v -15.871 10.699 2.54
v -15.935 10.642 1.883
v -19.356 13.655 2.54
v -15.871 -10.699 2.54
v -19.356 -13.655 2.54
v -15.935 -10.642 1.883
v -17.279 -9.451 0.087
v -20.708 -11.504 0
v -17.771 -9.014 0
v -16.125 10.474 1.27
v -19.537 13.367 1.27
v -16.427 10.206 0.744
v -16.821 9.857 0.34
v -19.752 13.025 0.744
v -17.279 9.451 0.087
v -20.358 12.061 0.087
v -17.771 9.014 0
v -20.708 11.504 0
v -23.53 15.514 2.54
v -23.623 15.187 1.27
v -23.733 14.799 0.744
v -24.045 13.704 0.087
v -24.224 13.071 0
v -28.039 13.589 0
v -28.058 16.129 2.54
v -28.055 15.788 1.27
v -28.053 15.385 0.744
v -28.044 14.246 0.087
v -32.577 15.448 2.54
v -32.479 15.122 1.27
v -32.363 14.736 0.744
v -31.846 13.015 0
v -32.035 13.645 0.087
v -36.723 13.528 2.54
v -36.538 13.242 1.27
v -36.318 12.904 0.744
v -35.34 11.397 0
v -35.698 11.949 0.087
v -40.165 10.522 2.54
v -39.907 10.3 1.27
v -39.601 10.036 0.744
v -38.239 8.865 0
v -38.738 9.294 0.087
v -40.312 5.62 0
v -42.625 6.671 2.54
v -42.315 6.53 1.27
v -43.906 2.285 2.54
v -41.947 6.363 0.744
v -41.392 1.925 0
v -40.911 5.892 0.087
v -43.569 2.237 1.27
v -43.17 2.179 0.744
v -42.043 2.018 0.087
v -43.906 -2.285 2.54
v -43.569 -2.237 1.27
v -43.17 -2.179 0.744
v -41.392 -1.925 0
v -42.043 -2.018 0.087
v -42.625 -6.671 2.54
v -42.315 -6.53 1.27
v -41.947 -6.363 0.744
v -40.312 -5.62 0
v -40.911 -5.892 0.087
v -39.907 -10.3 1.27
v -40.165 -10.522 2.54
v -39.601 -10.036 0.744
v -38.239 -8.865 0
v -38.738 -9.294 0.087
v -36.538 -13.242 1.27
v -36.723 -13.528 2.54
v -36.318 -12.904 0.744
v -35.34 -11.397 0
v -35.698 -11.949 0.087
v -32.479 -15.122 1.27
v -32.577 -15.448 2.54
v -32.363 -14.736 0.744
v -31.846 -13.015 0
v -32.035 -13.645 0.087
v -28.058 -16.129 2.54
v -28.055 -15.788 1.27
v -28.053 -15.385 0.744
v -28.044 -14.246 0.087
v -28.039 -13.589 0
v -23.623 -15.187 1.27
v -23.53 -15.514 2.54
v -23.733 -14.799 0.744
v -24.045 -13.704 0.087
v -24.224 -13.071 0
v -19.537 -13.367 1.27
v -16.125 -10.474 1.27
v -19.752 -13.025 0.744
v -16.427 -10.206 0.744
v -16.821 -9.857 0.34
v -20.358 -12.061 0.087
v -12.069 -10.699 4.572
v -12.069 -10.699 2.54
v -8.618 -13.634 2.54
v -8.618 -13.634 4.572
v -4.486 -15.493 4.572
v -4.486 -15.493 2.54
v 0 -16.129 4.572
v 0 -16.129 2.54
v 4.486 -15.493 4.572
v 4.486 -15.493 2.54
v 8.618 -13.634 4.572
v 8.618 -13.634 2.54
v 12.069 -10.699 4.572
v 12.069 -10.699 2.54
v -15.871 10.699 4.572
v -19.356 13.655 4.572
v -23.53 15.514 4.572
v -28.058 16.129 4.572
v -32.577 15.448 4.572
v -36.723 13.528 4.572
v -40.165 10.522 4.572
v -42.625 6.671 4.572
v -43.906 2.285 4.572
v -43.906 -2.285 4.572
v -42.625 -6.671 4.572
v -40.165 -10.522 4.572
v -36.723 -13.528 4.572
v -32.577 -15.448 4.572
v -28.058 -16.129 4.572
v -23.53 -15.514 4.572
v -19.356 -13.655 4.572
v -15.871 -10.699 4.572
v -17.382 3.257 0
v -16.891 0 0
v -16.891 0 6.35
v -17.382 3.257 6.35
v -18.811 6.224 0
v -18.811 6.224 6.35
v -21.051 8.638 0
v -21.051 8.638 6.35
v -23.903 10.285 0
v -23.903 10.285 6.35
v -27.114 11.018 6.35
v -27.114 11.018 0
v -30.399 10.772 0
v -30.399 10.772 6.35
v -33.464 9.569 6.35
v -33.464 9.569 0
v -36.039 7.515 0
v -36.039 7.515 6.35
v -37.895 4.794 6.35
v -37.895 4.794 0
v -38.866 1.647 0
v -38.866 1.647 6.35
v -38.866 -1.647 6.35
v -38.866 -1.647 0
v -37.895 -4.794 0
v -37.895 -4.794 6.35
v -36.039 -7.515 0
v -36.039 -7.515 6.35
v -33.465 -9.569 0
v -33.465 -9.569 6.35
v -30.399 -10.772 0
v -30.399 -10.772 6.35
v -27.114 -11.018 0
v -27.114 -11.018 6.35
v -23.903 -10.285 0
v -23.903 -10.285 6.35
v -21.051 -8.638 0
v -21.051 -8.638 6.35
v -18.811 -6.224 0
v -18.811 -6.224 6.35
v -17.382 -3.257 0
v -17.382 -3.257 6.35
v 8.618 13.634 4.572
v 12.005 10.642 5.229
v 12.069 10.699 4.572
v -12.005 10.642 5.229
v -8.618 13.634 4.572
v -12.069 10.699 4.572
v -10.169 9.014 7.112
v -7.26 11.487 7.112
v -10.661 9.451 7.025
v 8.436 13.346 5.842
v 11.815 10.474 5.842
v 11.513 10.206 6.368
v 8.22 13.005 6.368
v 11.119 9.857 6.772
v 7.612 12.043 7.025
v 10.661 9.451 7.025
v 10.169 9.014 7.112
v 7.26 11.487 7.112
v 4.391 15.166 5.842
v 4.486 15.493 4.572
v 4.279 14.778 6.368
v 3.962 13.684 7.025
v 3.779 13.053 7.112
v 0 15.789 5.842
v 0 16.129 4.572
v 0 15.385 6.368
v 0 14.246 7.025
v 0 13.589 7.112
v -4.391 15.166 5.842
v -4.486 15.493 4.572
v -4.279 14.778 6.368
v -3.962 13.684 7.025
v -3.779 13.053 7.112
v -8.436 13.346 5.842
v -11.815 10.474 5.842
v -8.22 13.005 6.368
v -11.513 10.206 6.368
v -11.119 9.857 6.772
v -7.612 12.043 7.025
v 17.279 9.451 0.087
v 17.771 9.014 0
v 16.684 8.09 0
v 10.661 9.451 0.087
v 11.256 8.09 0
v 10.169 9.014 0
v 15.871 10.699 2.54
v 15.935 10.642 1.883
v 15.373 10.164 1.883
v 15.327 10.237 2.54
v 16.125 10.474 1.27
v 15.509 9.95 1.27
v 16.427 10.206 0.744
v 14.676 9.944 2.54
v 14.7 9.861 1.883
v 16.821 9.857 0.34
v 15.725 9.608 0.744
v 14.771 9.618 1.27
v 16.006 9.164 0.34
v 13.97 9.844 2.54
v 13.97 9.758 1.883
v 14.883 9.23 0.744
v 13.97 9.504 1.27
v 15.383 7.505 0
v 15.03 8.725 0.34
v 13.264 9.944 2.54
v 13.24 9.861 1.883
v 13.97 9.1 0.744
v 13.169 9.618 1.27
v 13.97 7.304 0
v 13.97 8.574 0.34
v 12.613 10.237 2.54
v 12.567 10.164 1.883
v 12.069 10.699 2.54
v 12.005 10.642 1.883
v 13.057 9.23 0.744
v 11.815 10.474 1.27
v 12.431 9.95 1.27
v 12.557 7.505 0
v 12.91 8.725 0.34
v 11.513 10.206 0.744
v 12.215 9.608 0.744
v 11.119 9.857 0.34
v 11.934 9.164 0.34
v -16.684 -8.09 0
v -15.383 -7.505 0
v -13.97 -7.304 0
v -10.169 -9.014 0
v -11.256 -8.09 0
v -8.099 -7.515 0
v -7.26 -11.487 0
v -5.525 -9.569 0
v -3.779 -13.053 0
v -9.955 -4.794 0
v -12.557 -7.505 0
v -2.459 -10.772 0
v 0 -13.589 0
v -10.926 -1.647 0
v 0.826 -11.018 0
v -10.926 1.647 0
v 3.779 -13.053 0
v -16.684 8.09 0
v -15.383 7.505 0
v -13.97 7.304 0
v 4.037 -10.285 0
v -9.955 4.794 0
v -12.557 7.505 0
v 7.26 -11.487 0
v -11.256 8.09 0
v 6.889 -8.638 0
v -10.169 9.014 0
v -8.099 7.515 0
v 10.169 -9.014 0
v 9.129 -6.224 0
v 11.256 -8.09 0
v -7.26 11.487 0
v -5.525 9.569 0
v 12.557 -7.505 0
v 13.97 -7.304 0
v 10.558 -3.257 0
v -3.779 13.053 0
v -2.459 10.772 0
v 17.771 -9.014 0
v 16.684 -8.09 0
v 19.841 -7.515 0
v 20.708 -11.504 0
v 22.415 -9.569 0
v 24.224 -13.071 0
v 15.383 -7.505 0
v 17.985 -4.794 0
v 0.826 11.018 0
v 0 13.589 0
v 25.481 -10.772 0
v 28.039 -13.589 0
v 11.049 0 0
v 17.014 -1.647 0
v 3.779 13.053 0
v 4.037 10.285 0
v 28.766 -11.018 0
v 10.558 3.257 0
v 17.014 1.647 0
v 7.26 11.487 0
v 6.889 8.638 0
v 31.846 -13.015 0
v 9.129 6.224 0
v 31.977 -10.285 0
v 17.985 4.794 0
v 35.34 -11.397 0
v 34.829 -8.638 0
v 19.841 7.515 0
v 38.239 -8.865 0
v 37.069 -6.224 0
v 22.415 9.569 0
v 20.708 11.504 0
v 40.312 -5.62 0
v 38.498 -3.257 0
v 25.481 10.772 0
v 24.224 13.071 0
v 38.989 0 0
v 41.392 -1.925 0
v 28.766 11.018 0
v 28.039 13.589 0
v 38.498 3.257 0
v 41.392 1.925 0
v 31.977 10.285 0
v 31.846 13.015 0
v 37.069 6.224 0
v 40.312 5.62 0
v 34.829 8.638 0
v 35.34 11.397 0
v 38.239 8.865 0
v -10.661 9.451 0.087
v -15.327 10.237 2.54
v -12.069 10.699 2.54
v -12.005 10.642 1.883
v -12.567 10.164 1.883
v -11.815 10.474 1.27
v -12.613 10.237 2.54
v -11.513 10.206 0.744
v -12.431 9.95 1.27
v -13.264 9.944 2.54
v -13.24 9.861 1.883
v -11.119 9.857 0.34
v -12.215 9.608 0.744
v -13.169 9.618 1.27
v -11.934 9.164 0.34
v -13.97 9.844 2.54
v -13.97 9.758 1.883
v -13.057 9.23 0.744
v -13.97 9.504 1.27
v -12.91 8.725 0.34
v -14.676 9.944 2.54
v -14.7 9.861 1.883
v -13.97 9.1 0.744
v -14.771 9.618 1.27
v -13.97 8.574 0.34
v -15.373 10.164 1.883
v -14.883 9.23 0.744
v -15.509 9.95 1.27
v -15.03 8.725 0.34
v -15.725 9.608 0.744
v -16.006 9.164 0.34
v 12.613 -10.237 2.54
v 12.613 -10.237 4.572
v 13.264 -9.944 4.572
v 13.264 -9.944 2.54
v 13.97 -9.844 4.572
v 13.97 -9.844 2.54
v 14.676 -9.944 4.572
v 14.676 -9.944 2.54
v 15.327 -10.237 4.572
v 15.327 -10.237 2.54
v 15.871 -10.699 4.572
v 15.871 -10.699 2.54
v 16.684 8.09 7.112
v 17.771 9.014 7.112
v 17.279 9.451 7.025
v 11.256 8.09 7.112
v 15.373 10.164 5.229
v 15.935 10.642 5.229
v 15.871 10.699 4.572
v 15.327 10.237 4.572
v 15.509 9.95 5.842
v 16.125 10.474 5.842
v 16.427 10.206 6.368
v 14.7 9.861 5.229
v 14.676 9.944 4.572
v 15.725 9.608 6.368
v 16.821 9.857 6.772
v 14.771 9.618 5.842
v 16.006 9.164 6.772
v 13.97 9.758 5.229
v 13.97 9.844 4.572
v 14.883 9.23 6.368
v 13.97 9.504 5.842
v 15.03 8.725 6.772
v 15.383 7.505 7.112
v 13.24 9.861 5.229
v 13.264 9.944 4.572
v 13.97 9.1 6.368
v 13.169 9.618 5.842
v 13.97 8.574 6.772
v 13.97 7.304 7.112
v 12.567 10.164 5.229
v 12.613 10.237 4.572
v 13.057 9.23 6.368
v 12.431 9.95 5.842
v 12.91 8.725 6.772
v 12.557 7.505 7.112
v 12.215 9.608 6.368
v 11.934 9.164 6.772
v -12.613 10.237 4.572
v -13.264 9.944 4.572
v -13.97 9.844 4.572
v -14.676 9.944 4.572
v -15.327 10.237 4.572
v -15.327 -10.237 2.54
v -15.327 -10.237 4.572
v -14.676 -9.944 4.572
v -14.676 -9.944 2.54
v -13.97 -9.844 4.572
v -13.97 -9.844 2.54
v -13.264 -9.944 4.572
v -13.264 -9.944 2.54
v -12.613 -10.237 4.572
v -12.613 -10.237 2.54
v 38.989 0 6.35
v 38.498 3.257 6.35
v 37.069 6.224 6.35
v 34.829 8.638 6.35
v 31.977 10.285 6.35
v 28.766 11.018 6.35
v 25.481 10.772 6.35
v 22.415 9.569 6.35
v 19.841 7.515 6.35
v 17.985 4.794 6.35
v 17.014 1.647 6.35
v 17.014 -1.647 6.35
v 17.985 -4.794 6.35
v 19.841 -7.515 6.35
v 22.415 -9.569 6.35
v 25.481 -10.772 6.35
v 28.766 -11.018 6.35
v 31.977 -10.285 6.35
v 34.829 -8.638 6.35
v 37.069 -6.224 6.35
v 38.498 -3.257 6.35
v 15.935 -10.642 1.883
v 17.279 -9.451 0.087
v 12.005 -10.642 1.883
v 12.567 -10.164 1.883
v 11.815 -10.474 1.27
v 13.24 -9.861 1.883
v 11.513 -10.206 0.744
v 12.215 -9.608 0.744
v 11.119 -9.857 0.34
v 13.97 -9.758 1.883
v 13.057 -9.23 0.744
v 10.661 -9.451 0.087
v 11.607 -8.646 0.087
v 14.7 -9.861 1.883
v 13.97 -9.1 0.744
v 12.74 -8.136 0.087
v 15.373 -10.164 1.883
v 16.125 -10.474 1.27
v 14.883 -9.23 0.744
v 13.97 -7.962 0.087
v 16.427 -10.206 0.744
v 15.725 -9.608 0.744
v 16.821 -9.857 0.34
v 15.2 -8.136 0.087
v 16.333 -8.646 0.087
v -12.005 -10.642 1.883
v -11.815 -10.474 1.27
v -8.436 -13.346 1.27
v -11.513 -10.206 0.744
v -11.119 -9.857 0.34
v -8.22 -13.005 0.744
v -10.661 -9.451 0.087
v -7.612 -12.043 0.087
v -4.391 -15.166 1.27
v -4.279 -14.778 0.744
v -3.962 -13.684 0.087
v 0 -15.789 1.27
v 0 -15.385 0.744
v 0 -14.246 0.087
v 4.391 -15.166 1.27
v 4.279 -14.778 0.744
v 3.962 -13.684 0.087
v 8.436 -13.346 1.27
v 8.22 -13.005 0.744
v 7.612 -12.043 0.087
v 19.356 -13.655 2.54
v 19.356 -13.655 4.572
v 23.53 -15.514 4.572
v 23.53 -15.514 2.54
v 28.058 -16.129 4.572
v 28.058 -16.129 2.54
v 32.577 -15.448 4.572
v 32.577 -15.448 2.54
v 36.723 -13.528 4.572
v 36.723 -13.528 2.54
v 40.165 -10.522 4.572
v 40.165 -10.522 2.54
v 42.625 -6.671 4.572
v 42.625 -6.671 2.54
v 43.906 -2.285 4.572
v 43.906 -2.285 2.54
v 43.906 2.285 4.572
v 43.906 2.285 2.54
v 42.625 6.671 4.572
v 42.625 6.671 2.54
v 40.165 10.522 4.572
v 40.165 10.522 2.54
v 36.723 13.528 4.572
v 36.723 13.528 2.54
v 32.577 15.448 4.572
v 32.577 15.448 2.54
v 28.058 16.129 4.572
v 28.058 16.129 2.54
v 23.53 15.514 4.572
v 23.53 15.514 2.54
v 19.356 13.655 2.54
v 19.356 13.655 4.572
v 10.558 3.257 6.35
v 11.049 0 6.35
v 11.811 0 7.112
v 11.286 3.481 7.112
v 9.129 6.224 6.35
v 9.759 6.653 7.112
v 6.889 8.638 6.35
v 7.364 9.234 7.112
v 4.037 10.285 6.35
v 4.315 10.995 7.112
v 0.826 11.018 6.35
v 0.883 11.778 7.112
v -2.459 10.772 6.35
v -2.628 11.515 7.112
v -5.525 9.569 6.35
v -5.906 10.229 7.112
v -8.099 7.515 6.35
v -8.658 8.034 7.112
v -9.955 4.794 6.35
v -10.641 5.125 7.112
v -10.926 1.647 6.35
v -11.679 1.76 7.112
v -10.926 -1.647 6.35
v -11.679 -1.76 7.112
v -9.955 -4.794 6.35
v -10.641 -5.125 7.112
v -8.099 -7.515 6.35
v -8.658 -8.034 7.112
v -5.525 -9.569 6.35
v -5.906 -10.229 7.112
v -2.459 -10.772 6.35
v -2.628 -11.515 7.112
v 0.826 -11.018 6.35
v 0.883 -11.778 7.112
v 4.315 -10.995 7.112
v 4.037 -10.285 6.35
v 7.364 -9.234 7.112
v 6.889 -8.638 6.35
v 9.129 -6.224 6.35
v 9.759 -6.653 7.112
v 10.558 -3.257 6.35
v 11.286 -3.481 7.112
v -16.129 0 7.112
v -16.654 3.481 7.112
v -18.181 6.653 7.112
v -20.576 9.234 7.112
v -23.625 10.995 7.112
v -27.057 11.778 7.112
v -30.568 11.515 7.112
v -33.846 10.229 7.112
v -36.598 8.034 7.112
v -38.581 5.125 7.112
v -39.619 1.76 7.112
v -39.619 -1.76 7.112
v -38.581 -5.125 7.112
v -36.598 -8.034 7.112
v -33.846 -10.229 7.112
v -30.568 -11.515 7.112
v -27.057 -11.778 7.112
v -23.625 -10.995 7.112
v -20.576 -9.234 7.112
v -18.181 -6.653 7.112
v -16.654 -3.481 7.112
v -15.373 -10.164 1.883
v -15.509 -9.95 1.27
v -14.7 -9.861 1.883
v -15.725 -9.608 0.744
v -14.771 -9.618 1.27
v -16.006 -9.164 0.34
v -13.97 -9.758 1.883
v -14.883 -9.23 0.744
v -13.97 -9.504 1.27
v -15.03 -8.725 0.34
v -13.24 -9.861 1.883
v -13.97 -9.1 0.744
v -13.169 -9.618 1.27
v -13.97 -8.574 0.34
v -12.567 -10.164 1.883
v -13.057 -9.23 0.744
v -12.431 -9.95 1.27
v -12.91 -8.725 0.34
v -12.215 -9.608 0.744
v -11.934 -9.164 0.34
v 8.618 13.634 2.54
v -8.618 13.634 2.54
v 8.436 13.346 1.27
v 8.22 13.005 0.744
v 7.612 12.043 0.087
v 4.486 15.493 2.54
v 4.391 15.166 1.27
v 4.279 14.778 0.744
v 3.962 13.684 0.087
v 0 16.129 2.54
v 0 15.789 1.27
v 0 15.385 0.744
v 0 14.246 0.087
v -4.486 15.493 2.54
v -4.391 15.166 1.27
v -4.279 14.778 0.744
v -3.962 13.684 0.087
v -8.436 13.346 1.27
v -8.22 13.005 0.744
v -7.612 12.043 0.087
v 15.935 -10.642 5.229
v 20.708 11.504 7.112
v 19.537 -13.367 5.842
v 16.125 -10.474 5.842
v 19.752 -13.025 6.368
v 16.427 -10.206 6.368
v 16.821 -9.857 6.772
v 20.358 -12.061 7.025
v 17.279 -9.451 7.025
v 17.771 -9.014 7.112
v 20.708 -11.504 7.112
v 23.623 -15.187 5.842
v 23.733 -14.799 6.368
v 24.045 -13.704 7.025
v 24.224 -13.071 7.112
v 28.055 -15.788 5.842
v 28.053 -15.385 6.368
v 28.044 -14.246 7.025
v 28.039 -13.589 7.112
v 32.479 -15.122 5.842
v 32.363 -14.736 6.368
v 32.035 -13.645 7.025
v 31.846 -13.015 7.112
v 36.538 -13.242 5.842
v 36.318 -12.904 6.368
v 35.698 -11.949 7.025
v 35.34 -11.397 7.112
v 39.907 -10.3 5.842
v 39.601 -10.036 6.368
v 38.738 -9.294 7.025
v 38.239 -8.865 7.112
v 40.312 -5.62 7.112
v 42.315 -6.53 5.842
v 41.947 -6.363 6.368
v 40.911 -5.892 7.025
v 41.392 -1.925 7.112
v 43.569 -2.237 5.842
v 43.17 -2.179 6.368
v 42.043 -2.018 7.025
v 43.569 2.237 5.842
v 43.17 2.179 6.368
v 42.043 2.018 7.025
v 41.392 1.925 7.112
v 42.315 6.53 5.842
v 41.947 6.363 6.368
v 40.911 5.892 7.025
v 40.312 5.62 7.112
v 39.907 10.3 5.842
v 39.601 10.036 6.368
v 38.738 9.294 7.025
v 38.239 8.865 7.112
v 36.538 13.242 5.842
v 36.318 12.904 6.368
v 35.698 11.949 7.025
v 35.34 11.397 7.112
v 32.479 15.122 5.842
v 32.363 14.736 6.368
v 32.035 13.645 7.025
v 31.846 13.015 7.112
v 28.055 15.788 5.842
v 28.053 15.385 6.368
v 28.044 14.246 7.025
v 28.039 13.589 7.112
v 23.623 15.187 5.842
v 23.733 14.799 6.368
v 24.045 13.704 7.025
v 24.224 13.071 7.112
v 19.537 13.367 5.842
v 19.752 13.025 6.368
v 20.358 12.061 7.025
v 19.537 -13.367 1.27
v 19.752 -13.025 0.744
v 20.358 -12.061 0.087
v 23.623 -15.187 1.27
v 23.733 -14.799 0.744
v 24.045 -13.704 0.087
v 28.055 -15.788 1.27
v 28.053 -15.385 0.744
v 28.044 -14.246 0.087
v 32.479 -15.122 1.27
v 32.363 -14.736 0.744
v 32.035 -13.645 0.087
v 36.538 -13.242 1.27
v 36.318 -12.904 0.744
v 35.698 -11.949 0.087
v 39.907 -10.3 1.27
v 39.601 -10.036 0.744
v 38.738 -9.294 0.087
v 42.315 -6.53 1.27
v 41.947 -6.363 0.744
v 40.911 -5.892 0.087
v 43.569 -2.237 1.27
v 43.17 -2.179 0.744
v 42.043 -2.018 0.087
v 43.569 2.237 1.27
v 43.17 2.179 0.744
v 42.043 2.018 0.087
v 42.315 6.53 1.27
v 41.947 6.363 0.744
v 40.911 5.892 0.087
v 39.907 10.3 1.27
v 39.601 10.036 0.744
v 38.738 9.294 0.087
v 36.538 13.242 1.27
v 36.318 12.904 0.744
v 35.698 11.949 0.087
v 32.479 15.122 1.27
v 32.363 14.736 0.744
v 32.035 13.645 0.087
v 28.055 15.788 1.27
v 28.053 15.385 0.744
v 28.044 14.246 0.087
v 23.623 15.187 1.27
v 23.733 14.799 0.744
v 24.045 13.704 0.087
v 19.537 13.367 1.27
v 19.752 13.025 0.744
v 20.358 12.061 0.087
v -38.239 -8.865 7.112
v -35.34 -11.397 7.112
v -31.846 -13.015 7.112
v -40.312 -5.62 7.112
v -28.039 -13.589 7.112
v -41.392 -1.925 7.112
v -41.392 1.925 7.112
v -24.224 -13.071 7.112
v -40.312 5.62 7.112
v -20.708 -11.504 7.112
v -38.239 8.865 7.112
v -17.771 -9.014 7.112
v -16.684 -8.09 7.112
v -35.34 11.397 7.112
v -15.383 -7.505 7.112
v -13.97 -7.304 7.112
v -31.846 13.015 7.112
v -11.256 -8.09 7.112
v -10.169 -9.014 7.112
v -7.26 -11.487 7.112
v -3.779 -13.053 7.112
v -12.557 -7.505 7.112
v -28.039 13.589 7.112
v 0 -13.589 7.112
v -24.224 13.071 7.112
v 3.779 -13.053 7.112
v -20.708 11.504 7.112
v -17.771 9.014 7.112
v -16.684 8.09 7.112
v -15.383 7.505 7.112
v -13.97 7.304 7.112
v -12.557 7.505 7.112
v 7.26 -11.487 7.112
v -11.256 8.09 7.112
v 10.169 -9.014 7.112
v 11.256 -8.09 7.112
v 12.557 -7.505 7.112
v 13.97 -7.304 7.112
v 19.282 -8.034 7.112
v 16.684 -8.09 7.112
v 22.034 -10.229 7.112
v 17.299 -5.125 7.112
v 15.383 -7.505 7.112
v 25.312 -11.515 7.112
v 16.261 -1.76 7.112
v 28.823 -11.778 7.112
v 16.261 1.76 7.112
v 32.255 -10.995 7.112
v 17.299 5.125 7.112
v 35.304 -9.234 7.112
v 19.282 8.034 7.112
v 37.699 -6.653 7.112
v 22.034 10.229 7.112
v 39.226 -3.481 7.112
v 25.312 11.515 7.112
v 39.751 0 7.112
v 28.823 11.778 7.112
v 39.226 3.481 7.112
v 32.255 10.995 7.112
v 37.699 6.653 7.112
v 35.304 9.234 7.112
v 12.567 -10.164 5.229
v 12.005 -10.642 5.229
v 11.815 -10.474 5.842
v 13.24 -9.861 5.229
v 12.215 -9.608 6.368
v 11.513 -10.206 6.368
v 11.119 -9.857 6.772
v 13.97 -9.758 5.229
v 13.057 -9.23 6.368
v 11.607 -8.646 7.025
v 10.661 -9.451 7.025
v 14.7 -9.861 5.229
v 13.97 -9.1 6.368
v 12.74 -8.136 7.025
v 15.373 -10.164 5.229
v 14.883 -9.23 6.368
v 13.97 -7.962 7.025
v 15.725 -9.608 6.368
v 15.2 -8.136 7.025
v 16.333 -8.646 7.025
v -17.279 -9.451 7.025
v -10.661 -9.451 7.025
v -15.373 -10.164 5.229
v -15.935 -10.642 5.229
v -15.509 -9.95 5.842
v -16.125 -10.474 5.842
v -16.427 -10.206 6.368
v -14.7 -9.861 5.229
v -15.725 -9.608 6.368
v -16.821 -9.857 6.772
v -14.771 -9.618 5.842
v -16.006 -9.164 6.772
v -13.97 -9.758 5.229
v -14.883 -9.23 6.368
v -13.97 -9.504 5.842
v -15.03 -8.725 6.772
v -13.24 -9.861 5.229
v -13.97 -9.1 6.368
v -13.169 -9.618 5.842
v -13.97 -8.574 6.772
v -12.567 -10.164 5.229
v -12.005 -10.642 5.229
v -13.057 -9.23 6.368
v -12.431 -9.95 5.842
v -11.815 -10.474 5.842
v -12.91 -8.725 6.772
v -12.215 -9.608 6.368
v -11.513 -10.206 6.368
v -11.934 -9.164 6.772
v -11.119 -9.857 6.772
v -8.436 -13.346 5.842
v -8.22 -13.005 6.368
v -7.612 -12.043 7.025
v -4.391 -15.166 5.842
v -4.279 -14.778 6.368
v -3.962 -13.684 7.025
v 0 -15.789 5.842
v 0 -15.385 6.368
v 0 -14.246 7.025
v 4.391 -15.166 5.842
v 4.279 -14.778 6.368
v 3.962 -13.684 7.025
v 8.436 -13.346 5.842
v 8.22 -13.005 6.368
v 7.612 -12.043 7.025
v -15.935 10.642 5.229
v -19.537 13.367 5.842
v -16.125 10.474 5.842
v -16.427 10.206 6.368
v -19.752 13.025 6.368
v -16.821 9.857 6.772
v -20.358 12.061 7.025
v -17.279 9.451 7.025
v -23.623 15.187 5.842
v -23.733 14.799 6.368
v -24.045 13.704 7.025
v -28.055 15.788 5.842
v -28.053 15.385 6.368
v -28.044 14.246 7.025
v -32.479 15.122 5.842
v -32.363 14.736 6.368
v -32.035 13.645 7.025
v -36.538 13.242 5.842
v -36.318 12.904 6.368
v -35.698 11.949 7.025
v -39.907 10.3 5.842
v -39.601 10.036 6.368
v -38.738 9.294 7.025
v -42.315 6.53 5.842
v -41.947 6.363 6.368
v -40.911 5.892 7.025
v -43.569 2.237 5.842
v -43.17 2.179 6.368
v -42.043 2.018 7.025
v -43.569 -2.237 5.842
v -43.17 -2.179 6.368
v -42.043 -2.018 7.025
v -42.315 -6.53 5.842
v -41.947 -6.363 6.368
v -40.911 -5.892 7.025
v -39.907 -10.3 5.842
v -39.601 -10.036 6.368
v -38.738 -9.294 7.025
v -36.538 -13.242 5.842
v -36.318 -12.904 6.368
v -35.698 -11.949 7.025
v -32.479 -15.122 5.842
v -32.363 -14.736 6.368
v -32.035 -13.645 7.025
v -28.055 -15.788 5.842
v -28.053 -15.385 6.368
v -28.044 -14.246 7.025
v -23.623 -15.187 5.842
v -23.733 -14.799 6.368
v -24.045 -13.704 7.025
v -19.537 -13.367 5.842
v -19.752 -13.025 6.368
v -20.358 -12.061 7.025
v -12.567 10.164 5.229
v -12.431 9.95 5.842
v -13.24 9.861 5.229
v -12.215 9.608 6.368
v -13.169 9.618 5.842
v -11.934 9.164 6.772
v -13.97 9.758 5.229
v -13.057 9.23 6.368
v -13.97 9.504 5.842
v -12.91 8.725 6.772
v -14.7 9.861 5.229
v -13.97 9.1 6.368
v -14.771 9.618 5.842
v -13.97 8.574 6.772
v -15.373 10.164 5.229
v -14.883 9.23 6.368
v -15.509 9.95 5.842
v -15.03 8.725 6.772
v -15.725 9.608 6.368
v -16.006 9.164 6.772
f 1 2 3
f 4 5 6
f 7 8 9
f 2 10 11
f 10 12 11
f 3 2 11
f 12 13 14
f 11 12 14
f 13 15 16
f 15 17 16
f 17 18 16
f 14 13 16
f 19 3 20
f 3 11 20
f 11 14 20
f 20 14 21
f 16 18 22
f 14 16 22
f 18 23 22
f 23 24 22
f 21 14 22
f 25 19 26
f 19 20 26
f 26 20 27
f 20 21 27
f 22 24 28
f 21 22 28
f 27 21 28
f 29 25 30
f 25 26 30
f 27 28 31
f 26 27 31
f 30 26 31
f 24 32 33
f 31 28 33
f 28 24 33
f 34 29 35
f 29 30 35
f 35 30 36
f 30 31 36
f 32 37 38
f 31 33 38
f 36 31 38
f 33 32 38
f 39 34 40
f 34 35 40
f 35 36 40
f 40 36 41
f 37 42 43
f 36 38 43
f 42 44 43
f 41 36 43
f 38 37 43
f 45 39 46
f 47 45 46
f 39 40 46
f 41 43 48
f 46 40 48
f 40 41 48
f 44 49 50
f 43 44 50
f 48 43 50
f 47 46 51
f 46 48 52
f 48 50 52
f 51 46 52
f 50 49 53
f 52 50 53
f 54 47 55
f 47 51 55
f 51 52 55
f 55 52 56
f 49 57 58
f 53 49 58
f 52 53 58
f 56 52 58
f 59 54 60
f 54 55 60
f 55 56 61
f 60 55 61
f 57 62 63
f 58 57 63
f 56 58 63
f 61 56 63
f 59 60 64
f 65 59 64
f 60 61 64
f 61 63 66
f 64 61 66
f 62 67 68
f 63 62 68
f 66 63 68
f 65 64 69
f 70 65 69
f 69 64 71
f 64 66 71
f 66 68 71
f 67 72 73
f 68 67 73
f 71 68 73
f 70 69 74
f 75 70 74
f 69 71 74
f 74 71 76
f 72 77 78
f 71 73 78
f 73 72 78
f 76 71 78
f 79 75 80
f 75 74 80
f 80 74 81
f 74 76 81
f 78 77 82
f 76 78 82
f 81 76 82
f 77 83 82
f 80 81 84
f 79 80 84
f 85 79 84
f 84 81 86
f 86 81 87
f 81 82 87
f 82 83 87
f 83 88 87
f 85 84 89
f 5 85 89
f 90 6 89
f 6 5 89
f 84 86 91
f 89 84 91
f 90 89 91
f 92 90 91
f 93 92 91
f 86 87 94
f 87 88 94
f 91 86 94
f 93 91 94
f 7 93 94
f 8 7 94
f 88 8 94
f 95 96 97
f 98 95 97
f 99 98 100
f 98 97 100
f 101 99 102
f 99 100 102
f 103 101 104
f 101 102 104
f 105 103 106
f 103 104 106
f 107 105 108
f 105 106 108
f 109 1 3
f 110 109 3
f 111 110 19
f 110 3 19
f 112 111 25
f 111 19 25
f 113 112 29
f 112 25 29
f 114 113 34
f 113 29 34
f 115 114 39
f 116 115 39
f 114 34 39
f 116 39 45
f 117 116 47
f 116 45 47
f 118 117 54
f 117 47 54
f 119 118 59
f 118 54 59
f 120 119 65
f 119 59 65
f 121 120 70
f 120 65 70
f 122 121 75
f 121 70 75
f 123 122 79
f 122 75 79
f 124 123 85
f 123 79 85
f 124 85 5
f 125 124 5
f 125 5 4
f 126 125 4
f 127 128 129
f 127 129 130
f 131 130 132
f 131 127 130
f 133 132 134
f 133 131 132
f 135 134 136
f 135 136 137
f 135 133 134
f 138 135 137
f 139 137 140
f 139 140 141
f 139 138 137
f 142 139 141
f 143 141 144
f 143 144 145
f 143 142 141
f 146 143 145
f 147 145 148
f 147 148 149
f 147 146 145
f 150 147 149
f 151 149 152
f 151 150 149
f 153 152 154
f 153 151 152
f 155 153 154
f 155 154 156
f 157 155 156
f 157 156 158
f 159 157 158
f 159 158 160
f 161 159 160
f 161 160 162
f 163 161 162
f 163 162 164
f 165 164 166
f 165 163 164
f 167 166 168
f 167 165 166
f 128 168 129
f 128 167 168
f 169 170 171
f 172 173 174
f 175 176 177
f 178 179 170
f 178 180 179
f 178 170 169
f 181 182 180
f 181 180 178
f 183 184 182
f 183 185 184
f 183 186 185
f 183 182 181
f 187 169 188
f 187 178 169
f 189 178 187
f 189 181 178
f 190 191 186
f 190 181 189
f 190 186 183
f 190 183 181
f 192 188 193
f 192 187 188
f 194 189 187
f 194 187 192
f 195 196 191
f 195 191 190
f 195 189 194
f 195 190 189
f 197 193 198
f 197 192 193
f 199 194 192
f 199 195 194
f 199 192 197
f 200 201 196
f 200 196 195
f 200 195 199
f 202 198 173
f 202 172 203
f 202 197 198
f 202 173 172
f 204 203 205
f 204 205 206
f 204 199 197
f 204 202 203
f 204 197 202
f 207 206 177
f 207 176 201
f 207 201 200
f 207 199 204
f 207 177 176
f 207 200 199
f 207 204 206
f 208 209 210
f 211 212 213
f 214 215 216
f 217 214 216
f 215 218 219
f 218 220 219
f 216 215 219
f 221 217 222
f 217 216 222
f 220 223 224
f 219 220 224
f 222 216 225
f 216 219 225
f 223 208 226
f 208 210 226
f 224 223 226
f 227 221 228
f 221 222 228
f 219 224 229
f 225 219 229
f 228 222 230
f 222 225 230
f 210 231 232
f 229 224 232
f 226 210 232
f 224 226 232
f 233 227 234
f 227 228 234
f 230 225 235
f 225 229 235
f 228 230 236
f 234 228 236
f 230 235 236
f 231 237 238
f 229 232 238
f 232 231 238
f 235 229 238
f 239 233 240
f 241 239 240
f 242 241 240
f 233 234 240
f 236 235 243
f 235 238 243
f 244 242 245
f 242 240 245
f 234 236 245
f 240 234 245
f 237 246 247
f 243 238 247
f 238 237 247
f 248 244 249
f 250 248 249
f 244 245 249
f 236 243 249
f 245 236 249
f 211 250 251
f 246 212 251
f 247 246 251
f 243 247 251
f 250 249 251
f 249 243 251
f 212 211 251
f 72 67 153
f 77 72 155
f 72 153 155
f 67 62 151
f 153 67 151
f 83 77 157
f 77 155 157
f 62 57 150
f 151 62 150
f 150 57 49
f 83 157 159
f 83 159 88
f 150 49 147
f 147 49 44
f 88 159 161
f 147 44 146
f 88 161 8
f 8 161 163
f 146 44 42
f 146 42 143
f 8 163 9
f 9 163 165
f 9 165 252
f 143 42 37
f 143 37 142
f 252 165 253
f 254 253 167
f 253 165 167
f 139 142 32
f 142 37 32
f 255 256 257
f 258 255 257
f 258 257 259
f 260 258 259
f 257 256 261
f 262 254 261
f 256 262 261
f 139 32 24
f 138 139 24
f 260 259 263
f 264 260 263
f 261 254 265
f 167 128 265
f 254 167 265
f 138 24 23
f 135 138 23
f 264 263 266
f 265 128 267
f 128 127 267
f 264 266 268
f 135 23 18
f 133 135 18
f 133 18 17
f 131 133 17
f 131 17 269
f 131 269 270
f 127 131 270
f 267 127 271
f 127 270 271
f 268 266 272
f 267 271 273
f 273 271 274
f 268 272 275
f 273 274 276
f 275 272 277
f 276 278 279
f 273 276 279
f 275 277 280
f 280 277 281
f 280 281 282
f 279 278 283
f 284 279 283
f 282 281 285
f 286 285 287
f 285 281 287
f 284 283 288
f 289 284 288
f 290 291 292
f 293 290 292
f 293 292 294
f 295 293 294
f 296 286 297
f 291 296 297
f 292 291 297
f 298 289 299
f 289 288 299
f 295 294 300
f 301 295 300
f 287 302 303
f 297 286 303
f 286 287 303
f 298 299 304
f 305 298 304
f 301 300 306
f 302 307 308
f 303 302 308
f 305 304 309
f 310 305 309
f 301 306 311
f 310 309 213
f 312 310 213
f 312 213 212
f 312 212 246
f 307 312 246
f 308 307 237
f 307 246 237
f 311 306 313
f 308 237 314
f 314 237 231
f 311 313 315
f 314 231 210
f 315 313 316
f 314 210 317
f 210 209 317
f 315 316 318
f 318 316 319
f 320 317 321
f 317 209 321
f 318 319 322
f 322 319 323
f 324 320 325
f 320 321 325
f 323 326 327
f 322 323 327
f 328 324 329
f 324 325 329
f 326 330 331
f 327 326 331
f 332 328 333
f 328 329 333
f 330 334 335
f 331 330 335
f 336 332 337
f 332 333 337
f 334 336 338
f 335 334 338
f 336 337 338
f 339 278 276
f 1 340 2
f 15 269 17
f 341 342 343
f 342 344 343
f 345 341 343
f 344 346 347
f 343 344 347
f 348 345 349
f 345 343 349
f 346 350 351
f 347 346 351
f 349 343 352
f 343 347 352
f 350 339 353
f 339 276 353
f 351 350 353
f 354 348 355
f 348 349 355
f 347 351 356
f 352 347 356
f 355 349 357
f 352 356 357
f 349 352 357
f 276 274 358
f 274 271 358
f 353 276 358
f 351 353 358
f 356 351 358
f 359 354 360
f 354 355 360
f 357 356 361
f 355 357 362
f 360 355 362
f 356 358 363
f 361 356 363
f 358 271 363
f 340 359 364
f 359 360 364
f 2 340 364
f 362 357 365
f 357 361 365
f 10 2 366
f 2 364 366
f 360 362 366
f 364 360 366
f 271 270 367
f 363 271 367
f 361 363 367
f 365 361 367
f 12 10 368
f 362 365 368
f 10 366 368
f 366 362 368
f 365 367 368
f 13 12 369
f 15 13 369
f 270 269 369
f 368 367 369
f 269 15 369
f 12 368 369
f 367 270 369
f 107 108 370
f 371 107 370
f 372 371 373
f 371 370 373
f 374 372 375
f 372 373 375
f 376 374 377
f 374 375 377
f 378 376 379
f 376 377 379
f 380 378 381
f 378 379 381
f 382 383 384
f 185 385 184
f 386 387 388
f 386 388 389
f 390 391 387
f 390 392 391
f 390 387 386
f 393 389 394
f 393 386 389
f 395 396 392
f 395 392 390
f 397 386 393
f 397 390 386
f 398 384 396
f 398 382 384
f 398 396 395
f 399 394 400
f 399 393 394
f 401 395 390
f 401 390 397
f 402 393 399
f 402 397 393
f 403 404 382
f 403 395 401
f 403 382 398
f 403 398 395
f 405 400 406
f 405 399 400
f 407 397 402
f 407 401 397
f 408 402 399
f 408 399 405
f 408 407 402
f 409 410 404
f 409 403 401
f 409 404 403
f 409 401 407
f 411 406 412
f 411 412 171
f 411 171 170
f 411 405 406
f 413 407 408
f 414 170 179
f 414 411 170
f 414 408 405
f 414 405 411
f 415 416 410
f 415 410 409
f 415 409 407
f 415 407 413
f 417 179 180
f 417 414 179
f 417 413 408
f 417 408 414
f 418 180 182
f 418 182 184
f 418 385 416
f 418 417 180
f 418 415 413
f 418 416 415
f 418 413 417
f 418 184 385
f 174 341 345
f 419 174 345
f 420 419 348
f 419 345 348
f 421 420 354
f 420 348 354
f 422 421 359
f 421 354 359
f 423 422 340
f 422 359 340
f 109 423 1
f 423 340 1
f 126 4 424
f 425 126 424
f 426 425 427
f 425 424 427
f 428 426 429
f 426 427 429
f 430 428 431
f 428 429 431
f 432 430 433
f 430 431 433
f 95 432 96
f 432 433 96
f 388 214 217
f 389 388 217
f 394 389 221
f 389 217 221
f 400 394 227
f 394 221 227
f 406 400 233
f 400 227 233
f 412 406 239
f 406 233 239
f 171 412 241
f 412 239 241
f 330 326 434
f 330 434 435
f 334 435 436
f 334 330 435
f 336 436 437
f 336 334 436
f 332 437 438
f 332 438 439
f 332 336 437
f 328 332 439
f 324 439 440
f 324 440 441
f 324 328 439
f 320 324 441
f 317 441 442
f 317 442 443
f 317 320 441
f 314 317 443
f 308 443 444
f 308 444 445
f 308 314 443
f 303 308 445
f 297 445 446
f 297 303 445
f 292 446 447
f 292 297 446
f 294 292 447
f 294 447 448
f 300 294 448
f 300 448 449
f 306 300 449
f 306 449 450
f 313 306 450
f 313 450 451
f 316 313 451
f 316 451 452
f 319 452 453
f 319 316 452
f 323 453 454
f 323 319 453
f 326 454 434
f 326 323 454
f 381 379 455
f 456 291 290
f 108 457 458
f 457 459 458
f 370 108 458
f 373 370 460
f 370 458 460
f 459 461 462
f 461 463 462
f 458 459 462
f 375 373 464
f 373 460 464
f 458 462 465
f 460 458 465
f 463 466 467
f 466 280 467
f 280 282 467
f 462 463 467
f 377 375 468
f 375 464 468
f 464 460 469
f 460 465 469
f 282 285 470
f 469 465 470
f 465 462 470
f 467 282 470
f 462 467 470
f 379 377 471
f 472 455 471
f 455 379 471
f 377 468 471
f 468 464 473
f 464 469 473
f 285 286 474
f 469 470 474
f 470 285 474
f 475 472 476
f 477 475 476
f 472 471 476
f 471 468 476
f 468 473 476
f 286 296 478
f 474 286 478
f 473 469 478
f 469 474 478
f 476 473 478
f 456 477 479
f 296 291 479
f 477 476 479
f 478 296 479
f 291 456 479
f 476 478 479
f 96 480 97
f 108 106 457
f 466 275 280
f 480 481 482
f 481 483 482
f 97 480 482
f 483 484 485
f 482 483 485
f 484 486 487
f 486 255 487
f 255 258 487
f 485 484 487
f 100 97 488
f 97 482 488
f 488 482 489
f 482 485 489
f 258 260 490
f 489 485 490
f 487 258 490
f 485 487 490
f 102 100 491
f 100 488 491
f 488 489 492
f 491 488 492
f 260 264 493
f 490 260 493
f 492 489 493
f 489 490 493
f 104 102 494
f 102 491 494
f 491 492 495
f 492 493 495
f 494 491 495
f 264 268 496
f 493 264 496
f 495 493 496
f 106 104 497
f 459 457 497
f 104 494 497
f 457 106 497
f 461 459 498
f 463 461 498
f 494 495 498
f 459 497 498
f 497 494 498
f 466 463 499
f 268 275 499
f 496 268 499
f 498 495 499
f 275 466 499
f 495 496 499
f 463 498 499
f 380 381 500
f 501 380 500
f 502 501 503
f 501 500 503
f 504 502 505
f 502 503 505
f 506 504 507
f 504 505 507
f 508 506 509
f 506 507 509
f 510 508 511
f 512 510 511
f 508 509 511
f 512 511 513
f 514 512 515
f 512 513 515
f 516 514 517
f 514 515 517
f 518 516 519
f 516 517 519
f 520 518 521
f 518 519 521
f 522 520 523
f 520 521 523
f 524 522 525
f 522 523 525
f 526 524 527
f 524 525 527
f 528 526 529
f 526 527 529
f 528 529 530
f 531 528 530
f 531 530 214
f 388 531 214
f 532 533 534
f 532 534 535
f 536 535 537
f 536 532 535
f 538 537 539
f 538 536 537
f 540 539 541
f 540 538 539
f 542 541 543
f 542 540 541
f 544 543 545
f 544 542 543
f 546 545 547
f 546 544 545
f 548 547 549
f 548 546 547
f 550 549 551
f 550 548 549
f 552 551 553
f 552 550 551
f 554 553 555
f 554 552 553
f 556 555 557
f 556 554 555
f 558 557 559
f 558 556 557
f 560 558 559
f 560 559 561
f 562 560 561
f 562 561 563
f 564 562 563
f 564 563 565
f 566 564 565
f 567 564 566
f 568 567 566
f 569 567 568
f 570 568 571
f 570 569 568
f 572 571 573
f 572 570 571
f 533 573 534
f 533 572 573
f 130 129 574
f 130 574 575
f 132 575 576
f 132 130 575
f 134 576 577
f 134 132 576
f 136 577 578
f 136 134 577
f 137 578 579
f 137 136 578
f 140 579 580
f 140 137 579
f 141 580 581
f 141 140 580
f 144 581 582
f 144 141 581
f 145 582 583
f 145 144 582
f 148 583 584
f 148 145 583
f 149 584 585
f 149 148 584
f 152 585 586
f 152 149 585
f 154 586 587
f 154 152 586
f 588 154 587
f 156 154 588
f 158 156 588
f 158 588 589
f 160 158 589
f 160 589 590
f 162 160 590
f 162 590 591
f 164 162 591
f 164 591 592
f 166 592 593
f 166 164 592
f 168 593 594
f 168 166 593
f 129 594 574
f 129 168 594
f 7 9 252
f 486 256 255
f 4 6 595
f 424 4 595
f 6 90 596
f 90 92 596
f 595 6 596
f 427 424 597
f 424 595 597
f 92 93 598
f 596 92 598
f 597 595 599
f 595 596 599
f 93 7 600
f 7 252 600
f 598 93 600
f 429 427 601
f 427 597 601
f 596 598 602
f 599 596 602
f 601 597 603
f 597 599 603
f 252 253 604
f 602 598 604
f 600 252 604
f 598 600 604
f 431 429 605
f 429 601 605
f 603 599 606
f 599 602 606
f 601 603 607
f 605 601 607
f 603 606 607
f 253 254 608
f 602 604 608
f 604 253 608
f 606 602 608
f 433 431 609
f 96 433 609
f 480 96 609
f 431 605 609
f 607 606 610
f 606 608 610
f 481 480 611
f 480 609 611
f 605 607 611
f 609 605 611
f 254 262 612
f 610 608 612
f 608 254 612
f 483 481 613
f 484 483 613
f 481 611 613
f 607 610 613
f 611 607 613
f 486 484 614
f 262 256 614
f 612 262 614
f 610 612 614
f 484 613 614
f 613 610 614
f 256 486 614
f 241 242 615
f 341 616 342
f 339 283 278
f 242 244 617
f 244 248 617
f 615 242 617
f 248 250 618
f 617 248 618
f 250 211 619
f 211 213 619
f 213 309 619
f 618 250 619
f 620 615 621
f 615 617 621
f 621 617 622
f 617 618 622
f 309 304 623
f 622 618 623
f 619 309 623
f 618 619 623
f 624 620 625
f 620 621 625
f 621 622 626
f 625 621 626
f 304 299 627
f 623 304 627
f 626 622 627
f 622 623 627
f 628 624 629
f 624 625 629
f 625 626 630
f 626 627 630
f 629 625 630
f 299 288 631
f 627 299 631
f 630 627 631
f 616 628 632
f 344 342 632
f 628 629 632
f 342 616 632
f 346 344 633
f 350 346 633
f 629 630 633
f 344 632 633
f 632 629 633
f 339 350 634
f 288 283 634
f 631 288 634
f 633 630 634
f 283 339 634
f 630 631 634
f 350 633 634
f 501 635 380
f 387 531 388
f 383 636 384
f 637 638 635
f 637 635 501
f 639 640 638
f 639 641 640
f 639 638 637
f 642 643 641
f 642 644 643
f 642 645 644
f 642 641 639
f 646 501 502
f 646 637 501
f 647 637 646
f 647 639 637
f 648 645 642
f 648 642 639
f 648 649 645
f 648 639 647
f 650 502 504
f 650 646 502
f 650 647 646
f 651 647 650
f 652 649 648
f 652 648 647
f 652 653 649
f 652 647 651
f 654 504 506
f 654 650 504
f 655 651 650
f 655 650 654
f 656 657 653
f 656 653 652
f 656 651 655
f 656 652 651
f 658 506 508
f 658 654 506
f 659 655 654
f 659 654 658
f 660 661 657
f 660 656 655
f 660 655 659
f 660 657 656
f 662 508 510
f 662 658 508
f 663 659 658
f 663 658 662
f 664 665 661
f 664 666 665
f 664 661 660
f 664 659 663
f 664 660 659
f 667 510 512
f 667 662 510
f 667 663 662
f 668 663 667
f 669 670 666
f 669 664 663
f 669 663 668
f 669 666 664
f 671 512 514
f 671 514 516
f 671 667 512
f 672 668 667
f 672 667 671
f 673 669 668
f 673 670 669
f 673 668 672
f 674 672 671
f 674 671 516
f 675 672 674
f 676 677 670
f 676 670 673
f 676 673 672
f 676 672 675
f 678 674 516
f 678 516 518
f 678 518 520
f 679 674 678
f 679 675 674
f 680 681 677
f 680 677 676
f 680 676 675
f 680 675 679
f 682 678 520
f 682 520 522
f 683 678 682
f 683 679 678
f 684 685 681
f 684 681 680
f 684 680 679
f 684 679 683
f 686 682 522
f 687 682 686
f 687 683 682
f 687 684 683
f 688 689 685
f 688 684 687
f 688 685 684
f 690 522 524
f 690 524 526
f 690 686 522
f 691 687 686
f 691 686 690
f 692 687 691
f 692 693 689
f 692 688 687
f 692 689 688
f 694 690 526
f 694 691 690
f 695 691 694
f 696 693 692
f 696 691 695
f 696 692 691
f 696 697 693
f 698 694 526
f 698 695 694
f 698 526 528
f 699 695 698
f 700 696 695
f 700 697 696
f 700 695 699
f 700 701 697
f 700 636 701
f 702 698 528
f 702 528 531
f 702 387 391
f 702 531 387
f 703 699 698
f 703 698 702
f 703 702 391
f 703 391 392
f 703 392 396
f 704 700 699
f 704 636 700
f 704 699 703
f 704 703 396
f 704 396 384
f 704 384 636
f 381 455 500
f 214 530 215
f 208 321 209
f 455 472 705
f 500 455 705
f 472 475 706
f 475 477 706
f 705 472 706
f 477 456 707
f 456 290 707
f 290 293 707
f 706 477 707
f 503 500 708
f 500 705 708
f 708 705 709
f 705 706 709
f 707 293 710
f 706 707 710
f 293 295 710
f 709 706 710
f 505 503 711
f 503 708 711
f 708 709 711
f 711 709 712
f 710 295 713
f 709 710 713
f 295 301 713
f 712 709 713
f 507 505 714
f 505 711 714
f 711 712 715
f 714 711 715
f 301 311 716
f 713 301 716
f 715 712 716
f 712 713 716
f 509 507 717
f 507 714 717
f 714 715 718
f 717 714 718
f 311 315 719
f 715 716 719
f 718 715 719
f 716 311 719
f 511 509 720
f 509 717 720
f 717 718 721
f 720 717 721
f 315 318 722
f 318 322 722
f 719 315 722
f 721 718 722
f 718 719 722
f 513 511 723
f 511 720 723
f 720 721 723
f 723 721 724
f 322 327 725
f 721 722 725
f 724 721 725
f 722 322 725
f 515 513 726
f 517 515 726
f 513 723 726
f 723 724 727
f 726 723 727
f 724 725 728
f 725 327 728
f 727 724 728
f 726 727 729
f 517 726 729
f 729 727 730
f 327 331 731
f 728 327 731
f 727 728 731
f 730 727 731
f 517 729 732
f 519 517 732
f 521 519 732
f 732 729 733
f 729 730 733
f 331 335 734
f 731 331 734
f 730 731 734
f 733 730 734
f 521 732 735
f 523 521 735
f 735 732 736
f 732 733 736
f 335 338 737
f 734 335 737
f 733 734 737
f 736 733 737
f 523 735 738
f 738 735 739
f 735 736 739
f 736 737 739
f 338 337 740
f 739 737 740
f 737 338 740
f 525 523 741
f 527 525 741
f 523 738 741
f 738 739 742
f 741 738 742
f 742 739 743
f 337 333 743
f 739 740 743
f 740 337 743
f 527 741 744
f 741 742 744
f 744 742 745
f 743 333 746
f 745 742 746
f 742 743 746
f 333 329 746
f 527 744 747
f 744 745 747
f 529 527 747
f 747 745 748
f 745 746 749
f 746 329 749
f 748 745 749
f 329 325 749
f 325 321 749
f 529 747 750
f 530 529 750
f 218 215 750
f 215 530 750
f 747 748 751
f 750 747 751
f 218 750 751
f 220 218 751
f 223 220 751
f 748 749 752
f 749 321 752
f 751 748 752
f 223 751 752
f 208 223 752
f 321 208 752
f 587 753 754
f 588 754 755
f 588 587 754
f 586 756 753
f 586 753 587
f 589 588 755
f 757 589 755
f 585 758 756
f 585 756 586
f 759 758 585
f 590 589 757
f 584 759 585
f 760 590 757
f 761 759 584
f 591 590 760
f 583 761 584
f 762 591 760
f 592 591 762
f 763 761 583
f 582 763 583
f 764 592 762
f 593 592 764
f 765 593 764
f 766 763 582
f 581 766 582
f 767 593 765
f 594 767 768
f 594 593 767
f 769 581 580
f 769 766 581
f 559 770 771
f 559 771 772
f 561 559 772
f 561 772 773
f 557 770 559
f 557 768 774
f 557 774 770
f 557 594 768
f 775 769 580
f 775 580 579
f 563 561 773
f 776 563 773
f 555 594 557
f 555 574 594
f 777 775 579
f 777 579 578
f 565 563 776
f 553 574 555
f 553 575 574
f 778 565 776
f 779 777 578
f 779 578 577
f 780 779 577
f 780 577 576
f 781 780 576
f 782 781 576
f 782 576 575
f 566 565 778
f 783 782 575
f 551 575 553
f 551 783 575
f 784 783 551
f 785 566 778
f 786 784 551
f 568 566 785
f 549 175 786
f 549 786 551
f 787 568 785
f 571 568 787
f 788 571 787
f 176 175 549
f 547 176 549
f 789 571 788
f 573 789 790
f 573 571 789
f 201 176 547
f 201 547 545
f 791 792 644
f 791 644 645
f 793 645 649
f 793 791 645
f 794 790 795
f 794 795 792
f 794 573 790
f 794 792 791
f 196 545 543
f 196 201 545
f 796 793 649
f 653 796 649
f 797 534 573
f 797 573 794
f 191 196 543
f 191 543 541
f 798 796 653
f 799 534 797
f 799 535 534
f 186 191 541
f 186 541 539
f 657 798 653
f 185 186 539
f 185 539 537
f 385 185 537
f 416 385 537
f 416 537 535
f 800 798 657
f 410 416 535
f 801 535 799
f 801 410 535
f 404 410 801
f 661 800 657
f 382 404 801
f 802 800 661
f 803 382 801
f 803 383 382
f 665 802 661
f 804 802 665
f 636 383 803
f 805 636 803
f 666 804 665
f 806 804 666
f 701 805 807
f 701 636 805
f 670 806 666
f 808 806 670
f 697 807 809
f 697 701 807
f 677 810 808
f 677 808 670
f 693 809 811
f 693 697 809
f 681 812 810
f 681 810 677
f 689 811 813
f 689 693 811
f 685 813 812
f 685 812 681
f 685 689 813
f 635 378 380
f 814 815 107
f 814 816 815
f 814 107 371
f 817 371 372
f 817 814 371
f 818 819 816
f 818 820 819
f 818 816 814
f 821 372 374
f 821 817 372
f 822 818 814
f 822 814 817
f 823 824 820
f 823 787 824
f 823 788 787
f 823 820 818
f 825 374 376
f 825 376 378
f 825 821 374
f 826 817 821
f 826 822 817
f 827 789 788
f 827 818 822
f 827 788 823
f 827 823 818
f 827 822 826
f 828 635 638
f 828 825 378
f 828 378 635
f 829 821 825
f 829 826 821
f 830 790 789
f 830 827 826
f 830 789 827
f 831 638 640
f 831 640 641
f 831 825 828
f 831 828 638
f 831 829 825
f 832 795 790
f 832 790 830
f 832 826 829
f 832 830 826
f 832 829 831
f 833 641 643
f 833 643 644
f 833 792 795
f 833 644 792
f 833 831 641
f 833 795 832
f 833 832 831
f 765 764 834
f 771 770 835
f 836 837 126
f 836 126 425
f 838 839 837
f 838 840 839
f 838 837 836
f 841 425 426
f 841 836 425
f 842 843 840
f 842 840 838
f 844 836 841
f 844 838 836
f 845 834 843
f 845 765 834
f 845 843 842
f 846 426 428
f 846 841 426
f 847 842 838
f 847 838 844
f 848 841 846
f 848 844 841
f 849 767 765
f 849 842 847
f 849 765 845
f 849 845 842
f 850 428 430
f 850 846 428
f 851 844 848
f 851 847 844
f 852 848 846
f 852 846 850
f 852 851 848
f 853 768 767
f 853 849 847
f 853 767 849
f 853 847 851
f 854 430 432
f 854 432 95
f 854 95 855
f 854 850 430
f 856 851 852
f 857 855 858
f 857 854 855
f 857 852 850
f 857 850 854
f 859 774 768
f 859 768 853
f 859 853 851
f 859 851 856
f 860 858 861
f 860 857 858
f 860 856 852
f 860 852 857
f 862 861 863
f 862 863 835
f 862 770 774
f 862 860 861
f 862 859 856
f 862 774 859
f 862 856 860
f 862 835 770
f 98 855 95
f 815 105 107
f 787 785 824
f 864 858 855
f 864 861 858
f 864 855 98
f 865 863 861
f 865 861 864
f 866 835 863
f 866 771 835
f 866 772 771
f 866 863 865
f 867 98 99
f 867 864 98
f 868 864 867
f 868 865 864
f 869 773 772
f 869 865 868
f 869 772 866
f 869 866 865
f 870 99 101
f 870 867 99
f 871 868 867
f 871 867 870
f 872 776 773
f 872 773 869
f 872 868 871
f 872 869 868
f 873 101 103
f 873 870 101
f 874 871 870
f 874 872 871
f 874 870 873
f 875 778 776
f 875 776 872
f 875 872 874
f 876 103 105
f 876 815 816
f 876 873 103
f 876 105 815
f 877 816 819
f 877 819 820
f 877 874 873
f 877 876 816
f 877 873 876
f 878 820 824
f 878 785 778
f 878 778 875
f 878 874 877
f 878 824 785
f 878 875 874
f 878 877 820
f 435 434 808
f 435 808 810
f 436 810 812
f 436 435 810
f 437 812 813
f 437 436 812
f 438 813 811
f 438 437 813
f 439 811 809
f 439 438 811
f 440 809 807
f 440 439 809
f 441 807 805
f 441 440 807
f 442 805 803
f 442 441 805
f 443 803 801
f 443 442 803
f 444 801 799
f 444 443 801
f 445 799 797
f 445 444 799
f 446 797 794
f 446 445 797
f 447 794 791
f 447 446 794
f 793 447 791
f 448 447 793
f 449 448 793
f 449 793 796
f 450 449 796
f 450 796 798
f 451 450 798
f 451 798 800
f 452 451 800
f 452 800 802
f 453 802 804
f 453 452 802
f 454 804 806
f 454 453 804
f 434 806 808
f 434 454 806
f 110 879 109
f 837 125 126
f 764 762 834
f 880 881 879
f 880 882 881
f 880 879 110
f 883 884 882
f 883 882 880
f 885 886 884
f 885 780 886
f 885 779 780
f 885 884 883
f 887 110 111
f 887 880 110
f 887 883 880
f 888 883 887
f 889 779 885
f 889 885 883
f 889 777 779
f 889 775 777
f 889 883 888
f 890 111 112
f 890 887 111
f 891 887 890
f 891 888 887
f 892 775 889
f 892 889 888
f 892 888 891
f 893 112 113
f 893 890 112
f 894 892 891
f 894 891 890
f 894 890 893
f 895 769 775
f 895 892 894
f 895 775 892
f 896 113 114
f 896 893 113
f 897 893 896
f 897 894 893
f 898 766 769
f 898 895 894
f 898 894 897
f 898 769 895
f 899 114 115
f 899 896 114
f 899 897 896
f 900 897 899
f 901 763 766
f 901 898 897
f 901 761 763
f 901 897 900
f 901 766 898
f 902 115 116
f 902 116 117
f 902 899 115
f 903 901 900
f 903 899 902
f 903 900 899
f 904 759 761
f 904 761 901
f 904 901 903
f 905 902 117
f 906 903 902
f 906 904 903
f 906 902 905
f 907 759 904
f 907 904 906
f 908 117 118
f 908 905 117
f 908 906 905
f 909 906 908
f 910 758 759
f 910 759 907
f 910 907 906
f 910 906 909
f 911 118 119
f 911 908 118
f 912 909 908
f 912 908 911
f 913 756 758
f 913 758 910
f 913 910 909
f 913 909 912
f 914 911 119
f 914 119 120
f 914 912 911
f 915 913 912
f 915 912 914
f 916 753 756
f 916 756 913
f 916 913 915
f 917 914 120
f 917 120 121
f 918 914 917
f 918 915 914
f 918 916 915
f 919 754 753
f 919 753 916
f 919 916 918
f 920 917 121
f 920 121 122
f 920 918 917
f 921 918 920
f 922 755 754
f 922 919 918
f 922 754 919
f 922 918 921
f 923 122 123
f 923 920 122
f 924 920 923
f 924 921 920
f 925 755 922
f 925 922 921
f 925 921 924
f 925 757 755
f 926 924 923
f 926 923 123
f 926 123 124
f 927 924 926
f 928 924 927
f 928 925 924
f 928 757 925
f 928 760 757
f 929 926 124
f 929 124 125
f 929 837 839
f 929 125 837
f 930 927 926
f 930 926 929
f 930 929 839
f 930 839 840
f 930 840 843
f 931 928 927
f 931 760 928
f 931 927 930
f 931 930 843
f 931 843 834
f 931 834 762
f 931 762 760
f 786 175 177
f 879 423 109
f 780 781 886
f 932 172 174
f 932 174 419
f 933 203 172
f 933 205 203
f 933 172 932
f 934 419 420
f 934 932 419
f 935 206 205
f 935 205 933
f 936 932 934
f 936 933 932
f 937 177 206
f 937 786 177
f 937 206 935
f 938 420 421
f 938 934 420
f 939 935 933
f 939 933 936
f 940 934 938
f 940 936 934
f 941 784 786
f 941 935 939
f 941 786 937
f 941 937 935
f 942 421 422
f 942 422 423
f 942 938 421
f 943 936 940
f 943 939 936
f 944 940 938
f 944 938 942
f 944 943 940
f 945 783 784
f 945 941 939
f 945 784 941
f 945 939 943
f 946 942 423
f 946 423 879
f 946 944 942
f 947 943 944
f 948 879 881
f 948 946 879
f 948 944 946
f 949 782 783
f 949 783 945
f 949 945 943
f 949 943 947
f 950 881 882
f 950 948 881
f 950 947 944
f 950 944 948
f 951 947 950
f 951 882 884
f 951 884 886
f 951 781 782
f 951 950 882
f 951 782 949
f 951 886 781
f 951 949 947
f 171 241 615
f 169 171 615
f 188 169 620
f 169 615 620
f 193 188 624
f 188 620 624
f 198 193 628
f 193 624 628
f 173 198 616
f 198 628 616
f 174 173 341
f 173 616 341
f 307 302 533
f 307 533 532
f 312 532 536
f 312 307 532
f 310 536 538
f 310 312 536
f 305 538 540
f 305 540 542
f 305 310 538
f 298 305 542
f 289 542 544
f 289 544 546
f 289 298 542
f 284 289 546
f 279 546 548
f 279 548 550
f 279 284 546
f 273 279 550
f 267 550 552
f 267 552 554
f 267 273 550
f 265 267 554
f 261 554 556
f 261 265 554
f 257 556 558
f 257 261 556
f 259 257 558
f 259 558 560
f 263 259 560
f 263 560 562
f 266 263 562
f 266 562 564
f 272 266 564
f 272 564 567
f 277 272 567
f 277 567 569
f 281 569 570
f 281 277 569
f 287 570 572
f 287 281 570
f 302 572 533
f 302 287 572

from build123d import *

# Parameters (mm, degrees)
F0_R     = 11.049
F1_DEPTH = 7.112
F2_R     = 2.54
F3_SIZE  = 0.762


with BuildPart() as f1:
    # F0 (on Top) → F1 (new body)
    with BuildSketch(Plane.XY):
        with BuildLine():
            ThreePointArc((-15.87068, -10.699353), (-13.97, -9.844291), (-12.06932, -10.699353))
            ThreePointArc((-12.06932, -10.699353), (0, -16.129), (12.06932, -10.699353))
            ThreePointArc((12.06932, -10.699353), (13.97, -9.844291), (15.87068, -10.699353))
            ThreePointArc((15.87068, -10.699353), (44.069, 0), (15.87068, 10.699353))
            ThreePointArc((15.87068, 10.699353), (13.97, 9.844291), (12.06932, 10.699353))
            ThreePointArc((12.06932, 10.699353), (0, 16.129), (-12.06932, 10.699353))
            ThreePointArc((-12.06932, 10.699353), (-13.97, 9.844291), (-15.87068, 10.699353))
            ThreePointArc((-15.87068, 10.699353), (-44.069, 0), (-15.87068, -10.699353))
        make_face()
        with Locations((-27.94, 0)):
            Circle(F0_R, mode=Mode.SUBTRACT)
        Circle(F0_R, mode=Mode.SUBTRACT)
        with Locations((27.94, 0)):
            Circle(F0_R, mode=Mode.SUBTRACT)
    extrude(amount=F1_DEPTH)

    # F2
    f2_edges = [f1.edges().sort_by_distance(p)[0] for p in [
        (44.069, 0, 7.112),
        (44.069, 0, 0),
    ]]
    fillet(f2_edges, radius=F2_R)

    # F3
    f3_edges = [f1.edges().sort_by_distance(p)[0] for p in [
        (-38.989, 0, 7.112),
        (-11.049, 0, 7.112),
        (16.891, 0, 7.112),
    ]]
    chamfer(f3_edges, length=F3_SIZE)


solid = f1.part
